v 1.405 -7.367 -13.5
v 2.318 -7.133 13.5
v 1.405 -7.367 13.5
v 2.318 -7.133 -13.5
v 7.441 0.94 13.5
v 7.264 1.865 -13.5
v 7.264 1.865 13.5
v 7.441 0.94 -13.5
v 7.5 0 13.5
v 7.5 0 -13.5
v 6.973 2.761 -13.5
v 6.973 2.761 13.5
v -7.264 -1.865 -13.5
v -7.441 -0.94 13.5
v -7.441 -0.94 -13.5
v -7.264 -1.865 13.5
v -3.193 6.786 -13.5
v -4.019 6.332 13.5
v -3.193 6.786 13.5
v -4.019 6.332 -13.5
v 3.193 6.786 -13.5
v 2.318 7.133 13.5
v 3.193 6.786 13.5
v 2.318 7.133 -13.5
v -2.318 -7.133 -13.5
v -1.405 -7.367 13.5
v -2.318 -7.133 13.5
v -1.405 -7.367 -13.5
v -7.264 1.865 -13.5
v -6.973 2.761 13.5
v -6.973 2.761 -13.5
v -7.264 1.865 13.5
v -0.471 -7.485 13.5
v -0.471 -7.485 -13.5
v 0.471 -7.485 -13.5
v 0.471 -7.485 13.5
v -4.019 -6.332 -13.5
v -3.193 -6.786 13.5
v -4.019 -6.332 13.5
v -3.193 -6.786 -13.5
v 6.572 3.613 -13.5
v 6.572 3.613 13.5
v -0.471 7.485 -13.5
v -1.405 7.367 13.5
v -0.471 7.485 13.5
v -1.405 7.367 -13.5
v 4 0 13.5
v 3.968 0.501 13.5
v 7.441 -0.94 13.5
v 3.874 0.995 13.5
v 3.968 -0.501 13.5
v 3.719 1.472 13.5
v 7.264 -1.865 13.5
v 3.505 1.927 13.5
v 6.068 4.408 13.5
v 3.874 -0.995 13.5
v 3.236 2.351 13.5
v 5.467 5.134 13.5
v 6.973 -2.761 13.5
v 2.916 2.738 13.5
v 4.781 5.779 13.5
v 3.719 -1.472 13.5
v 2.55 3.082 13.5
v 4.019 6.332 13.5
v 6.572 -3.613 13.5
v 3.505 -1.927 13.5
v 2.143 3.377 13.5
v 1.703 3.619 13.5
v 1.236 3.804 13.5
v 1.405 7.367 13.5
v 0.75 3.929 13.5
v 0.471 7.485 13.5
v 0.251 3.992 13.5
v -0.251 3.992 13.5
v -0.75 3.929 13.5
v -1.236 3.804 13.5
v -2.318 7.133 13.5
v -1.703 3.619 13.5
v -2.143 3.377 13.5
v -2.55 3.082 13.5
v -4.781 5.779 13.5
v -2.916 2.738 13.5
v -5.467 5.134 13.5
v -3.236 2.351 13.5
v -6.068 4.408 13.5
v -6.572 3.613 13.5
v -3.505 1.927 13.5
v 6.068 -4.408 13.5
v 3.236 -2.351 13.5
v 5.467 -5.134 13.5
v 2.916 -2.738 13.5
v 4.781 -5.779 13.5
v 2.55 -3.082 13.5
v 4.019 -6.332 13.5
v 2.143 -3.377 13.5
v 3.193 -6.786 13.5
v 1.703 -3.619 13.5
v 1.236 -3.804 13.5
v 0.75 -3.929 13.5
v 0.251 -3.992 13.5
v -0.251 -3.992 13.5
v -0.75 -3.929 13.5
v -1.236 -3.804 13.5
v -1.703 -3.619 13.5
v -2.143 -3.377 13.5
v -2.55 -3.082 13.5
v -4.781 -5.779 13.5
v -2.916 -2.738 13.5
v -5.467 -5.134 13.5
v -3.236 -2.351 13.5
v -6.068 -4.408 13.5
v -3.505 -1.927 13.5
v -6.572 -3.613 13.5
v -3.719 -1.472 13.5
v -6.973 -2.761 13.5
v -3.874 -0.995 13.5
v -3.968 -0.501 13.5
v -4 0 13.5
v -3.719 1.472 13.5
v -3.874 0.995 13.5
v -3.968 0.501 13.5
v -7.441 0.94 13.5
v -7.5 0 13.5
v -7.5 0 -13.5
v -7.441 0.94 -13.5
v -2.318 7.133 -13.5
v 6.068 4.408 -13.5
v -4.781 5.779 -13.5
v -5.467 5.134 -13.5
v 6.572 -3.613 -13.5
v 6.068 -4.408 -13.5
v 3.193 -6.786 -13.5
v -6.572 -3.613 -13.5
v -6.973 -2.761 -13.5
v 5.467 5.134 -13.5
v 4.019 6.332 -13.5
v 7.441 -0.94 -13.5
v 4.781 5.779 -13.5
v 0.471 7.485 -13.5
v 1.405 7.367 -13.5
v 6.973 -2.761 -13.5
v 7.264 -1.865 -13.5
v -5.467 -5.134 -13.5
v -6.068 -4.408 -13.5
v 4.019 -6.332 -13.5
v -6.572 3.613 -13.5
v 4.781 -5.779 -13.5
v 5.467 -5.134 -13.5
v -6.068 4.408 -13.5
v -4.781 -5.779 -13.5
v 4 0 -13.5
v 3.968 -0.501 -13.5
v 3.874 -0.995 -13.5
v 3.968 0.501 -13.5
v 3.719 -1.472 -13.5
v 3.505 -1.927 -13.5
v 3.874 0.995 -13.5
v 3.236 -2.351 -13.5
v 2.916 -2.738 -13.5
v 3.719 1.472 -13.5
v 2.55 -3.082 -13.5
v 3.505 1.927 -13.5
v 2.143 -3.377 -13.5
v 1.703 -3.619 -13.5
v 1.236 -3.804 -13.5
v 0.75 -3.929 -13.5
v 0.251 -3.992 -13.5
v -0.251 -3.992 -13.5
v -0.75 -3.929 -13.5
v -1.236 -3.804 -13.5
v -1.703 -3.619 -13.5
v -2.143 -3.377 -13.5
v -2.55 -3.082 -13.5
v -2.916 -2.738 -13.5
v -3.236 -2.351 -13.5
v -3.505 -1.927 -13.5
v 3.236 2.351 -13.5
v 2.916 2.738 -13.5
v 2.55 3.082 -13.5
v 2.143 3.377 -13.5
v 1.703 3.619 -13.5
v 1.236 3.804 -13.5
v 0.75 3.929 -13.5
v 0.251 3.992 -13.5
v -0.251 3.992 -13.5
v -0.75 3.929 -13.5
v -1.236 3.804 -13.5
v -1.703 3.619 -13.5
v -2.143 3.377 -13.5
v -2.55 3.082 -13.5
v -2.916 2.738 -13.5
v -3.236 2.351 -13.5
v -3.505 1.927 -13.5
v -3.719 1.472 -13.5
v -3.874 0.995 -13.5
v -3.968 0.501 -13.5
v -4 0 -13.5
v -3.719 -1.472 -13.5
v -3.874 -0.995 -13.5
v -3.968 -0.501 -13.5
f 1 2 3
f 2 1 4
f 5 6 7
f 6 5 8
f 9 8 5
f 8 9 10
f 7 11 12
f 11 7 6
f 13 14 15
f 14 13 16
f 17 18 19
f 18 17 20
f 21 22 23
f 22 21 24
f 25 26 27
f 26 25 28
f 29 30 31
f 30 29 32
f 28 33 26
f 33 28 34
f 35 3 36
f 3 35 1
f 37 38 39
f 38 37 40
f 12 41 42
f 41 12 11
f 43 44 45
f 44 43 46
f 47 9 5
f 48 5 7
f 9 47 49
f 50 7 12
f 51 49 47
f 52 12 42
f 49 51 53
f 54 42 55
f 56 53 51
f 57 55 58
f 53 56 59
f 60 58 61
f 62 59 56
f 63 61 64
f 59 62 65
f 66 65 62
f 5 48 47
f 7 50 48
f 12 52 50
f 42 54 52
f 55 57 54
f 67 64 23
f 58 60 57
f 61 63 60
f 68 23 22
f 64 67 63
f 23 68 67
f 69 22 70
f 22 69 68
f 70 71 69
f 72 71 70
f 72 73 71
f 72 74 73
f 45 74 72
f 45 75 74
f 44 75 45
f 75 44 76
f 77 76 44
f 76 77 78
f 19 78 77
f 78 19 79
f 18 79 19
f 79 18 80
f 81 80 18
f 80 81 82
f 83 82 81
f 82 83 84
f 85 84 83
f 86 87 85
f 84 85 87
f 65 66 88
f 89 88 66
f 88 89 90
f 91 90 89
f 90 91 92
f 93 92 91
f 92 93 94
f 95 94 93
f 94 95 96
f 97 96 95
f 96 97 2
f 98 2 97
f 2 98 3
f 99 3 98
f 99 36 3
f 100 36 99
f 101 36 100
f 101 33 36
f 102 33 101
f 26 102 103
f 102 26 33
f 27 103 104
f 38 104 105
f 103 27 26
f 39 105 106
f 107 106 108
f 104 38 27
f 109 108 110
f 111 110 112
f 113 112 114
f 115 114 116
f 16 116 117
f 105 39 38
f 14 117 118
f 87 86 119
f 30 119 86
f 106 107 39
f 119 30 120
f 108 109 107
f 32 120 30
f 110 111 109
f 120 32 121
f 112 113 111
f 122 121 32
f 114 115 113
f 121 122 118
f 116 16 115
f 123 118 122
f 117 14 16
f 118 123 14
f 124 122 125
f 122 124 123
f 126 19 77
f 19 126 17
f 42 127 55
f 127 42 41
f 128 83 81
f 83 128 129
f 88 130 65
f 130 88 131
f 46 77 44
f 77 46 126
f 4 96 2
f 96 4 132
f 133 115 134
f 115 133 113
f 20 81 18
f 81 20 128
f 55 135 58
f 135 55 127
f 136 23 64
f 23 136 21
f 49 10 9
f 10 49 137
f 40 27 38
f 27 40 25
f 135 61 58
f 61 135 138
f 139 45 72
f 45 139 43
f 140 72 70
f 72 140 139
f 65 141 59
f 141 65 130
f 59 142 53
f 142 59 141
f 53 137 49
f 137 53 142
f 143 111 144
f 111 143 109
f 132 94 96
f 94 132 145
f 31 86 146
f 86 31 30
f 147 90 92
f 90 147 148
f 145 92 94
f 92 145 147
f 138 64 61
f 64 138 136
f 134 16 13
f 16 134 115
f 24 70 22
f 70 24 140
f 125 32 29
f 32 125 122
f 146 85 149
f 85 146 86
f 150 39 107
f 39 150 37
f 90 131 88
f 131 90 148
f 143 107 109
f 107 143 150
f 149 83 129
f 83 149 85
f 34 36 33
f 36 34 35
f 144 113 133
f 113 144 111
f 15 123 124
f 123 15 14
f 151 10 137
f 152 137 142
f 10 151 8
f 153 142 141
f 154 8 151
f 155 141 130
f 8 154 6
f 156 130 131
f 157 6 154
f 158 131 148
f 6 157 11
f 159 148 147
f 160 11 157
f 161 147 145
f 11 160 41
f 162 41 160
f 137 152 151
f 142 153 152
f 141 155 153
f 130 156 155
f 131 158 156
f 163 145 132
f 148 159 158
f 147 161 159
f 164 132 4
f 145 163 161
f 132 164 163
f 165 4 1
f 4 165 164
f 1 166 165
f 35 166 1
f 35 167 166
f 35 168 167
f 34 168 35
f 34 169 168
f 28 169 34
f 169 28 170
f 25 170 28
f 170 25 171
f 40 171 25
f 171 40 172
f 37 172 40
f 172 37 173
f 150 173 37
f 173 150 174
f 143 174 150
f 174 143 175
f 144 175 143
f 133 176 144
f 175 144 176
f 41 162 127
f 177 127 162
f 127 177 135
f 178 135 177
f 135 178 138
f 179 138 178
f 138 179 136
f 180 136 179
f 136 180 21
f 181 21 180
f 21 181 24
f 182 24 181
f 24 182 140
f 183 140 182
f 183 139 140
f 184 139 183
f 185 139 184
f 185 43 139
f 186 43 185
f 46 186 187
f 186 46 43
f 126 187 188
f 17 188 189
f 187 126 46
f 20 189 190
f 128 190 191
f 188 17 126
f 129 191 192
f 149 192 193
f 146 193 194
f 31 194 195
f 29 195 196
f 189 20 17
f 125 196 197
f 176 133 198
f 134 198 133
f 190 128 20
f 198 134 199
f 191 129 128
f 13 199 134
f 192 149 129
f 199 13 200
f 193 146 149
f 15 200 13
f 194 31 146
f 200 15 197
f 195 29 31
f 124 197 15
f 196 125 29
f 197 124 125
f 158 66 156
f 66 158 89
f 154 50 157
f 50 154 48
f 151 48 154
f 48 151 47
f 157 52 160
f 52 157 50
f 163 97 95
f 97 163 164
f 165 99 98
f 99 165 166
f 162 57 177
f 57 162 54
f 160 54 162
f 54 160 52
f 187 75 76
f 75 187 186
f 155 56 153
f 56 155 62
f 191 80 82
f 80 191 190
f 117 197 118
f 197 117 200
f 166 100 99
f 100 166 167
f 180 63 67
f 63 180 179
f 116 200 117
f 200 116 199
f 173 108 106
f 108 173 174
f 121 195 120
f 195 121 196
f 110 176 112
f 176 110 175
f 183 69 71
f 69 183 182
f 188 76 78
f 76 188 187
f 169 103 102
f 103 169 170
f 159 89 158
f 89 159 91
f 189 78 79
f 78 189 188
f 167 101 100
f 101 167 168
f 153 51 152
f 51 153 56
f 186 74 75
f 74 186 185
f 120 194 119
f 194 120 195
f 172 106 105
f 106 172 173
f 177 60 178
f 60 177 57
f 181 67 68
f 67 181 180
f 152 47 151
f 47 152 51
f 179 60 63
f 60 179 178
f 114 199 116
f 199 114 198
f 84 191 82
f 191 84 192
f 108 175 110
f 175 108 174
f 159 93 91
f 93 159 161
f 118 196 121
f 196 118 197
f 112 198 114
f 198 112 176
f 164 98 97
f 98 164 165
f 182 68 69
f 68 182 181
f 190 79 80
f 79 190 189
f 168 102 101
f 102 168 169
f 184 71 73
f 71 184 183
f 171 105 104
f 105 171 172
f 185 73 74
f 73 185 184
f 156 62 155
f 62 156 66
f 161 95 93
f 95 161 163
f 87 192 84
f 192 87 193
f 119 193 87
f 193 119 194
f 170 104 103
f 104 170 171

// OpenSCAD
$fn = 50;


difference() {
	union() {
		translate(v = [0, 0, -13.5000000000]) {
			cylinder(h = 27, r = 7.5000000000);
		}
	}
	union() {
		translate(v = [0, 0, -100.0000000000]) {
			cylinder(h = 200, r = 4.0000000000);
		}
	}
}
